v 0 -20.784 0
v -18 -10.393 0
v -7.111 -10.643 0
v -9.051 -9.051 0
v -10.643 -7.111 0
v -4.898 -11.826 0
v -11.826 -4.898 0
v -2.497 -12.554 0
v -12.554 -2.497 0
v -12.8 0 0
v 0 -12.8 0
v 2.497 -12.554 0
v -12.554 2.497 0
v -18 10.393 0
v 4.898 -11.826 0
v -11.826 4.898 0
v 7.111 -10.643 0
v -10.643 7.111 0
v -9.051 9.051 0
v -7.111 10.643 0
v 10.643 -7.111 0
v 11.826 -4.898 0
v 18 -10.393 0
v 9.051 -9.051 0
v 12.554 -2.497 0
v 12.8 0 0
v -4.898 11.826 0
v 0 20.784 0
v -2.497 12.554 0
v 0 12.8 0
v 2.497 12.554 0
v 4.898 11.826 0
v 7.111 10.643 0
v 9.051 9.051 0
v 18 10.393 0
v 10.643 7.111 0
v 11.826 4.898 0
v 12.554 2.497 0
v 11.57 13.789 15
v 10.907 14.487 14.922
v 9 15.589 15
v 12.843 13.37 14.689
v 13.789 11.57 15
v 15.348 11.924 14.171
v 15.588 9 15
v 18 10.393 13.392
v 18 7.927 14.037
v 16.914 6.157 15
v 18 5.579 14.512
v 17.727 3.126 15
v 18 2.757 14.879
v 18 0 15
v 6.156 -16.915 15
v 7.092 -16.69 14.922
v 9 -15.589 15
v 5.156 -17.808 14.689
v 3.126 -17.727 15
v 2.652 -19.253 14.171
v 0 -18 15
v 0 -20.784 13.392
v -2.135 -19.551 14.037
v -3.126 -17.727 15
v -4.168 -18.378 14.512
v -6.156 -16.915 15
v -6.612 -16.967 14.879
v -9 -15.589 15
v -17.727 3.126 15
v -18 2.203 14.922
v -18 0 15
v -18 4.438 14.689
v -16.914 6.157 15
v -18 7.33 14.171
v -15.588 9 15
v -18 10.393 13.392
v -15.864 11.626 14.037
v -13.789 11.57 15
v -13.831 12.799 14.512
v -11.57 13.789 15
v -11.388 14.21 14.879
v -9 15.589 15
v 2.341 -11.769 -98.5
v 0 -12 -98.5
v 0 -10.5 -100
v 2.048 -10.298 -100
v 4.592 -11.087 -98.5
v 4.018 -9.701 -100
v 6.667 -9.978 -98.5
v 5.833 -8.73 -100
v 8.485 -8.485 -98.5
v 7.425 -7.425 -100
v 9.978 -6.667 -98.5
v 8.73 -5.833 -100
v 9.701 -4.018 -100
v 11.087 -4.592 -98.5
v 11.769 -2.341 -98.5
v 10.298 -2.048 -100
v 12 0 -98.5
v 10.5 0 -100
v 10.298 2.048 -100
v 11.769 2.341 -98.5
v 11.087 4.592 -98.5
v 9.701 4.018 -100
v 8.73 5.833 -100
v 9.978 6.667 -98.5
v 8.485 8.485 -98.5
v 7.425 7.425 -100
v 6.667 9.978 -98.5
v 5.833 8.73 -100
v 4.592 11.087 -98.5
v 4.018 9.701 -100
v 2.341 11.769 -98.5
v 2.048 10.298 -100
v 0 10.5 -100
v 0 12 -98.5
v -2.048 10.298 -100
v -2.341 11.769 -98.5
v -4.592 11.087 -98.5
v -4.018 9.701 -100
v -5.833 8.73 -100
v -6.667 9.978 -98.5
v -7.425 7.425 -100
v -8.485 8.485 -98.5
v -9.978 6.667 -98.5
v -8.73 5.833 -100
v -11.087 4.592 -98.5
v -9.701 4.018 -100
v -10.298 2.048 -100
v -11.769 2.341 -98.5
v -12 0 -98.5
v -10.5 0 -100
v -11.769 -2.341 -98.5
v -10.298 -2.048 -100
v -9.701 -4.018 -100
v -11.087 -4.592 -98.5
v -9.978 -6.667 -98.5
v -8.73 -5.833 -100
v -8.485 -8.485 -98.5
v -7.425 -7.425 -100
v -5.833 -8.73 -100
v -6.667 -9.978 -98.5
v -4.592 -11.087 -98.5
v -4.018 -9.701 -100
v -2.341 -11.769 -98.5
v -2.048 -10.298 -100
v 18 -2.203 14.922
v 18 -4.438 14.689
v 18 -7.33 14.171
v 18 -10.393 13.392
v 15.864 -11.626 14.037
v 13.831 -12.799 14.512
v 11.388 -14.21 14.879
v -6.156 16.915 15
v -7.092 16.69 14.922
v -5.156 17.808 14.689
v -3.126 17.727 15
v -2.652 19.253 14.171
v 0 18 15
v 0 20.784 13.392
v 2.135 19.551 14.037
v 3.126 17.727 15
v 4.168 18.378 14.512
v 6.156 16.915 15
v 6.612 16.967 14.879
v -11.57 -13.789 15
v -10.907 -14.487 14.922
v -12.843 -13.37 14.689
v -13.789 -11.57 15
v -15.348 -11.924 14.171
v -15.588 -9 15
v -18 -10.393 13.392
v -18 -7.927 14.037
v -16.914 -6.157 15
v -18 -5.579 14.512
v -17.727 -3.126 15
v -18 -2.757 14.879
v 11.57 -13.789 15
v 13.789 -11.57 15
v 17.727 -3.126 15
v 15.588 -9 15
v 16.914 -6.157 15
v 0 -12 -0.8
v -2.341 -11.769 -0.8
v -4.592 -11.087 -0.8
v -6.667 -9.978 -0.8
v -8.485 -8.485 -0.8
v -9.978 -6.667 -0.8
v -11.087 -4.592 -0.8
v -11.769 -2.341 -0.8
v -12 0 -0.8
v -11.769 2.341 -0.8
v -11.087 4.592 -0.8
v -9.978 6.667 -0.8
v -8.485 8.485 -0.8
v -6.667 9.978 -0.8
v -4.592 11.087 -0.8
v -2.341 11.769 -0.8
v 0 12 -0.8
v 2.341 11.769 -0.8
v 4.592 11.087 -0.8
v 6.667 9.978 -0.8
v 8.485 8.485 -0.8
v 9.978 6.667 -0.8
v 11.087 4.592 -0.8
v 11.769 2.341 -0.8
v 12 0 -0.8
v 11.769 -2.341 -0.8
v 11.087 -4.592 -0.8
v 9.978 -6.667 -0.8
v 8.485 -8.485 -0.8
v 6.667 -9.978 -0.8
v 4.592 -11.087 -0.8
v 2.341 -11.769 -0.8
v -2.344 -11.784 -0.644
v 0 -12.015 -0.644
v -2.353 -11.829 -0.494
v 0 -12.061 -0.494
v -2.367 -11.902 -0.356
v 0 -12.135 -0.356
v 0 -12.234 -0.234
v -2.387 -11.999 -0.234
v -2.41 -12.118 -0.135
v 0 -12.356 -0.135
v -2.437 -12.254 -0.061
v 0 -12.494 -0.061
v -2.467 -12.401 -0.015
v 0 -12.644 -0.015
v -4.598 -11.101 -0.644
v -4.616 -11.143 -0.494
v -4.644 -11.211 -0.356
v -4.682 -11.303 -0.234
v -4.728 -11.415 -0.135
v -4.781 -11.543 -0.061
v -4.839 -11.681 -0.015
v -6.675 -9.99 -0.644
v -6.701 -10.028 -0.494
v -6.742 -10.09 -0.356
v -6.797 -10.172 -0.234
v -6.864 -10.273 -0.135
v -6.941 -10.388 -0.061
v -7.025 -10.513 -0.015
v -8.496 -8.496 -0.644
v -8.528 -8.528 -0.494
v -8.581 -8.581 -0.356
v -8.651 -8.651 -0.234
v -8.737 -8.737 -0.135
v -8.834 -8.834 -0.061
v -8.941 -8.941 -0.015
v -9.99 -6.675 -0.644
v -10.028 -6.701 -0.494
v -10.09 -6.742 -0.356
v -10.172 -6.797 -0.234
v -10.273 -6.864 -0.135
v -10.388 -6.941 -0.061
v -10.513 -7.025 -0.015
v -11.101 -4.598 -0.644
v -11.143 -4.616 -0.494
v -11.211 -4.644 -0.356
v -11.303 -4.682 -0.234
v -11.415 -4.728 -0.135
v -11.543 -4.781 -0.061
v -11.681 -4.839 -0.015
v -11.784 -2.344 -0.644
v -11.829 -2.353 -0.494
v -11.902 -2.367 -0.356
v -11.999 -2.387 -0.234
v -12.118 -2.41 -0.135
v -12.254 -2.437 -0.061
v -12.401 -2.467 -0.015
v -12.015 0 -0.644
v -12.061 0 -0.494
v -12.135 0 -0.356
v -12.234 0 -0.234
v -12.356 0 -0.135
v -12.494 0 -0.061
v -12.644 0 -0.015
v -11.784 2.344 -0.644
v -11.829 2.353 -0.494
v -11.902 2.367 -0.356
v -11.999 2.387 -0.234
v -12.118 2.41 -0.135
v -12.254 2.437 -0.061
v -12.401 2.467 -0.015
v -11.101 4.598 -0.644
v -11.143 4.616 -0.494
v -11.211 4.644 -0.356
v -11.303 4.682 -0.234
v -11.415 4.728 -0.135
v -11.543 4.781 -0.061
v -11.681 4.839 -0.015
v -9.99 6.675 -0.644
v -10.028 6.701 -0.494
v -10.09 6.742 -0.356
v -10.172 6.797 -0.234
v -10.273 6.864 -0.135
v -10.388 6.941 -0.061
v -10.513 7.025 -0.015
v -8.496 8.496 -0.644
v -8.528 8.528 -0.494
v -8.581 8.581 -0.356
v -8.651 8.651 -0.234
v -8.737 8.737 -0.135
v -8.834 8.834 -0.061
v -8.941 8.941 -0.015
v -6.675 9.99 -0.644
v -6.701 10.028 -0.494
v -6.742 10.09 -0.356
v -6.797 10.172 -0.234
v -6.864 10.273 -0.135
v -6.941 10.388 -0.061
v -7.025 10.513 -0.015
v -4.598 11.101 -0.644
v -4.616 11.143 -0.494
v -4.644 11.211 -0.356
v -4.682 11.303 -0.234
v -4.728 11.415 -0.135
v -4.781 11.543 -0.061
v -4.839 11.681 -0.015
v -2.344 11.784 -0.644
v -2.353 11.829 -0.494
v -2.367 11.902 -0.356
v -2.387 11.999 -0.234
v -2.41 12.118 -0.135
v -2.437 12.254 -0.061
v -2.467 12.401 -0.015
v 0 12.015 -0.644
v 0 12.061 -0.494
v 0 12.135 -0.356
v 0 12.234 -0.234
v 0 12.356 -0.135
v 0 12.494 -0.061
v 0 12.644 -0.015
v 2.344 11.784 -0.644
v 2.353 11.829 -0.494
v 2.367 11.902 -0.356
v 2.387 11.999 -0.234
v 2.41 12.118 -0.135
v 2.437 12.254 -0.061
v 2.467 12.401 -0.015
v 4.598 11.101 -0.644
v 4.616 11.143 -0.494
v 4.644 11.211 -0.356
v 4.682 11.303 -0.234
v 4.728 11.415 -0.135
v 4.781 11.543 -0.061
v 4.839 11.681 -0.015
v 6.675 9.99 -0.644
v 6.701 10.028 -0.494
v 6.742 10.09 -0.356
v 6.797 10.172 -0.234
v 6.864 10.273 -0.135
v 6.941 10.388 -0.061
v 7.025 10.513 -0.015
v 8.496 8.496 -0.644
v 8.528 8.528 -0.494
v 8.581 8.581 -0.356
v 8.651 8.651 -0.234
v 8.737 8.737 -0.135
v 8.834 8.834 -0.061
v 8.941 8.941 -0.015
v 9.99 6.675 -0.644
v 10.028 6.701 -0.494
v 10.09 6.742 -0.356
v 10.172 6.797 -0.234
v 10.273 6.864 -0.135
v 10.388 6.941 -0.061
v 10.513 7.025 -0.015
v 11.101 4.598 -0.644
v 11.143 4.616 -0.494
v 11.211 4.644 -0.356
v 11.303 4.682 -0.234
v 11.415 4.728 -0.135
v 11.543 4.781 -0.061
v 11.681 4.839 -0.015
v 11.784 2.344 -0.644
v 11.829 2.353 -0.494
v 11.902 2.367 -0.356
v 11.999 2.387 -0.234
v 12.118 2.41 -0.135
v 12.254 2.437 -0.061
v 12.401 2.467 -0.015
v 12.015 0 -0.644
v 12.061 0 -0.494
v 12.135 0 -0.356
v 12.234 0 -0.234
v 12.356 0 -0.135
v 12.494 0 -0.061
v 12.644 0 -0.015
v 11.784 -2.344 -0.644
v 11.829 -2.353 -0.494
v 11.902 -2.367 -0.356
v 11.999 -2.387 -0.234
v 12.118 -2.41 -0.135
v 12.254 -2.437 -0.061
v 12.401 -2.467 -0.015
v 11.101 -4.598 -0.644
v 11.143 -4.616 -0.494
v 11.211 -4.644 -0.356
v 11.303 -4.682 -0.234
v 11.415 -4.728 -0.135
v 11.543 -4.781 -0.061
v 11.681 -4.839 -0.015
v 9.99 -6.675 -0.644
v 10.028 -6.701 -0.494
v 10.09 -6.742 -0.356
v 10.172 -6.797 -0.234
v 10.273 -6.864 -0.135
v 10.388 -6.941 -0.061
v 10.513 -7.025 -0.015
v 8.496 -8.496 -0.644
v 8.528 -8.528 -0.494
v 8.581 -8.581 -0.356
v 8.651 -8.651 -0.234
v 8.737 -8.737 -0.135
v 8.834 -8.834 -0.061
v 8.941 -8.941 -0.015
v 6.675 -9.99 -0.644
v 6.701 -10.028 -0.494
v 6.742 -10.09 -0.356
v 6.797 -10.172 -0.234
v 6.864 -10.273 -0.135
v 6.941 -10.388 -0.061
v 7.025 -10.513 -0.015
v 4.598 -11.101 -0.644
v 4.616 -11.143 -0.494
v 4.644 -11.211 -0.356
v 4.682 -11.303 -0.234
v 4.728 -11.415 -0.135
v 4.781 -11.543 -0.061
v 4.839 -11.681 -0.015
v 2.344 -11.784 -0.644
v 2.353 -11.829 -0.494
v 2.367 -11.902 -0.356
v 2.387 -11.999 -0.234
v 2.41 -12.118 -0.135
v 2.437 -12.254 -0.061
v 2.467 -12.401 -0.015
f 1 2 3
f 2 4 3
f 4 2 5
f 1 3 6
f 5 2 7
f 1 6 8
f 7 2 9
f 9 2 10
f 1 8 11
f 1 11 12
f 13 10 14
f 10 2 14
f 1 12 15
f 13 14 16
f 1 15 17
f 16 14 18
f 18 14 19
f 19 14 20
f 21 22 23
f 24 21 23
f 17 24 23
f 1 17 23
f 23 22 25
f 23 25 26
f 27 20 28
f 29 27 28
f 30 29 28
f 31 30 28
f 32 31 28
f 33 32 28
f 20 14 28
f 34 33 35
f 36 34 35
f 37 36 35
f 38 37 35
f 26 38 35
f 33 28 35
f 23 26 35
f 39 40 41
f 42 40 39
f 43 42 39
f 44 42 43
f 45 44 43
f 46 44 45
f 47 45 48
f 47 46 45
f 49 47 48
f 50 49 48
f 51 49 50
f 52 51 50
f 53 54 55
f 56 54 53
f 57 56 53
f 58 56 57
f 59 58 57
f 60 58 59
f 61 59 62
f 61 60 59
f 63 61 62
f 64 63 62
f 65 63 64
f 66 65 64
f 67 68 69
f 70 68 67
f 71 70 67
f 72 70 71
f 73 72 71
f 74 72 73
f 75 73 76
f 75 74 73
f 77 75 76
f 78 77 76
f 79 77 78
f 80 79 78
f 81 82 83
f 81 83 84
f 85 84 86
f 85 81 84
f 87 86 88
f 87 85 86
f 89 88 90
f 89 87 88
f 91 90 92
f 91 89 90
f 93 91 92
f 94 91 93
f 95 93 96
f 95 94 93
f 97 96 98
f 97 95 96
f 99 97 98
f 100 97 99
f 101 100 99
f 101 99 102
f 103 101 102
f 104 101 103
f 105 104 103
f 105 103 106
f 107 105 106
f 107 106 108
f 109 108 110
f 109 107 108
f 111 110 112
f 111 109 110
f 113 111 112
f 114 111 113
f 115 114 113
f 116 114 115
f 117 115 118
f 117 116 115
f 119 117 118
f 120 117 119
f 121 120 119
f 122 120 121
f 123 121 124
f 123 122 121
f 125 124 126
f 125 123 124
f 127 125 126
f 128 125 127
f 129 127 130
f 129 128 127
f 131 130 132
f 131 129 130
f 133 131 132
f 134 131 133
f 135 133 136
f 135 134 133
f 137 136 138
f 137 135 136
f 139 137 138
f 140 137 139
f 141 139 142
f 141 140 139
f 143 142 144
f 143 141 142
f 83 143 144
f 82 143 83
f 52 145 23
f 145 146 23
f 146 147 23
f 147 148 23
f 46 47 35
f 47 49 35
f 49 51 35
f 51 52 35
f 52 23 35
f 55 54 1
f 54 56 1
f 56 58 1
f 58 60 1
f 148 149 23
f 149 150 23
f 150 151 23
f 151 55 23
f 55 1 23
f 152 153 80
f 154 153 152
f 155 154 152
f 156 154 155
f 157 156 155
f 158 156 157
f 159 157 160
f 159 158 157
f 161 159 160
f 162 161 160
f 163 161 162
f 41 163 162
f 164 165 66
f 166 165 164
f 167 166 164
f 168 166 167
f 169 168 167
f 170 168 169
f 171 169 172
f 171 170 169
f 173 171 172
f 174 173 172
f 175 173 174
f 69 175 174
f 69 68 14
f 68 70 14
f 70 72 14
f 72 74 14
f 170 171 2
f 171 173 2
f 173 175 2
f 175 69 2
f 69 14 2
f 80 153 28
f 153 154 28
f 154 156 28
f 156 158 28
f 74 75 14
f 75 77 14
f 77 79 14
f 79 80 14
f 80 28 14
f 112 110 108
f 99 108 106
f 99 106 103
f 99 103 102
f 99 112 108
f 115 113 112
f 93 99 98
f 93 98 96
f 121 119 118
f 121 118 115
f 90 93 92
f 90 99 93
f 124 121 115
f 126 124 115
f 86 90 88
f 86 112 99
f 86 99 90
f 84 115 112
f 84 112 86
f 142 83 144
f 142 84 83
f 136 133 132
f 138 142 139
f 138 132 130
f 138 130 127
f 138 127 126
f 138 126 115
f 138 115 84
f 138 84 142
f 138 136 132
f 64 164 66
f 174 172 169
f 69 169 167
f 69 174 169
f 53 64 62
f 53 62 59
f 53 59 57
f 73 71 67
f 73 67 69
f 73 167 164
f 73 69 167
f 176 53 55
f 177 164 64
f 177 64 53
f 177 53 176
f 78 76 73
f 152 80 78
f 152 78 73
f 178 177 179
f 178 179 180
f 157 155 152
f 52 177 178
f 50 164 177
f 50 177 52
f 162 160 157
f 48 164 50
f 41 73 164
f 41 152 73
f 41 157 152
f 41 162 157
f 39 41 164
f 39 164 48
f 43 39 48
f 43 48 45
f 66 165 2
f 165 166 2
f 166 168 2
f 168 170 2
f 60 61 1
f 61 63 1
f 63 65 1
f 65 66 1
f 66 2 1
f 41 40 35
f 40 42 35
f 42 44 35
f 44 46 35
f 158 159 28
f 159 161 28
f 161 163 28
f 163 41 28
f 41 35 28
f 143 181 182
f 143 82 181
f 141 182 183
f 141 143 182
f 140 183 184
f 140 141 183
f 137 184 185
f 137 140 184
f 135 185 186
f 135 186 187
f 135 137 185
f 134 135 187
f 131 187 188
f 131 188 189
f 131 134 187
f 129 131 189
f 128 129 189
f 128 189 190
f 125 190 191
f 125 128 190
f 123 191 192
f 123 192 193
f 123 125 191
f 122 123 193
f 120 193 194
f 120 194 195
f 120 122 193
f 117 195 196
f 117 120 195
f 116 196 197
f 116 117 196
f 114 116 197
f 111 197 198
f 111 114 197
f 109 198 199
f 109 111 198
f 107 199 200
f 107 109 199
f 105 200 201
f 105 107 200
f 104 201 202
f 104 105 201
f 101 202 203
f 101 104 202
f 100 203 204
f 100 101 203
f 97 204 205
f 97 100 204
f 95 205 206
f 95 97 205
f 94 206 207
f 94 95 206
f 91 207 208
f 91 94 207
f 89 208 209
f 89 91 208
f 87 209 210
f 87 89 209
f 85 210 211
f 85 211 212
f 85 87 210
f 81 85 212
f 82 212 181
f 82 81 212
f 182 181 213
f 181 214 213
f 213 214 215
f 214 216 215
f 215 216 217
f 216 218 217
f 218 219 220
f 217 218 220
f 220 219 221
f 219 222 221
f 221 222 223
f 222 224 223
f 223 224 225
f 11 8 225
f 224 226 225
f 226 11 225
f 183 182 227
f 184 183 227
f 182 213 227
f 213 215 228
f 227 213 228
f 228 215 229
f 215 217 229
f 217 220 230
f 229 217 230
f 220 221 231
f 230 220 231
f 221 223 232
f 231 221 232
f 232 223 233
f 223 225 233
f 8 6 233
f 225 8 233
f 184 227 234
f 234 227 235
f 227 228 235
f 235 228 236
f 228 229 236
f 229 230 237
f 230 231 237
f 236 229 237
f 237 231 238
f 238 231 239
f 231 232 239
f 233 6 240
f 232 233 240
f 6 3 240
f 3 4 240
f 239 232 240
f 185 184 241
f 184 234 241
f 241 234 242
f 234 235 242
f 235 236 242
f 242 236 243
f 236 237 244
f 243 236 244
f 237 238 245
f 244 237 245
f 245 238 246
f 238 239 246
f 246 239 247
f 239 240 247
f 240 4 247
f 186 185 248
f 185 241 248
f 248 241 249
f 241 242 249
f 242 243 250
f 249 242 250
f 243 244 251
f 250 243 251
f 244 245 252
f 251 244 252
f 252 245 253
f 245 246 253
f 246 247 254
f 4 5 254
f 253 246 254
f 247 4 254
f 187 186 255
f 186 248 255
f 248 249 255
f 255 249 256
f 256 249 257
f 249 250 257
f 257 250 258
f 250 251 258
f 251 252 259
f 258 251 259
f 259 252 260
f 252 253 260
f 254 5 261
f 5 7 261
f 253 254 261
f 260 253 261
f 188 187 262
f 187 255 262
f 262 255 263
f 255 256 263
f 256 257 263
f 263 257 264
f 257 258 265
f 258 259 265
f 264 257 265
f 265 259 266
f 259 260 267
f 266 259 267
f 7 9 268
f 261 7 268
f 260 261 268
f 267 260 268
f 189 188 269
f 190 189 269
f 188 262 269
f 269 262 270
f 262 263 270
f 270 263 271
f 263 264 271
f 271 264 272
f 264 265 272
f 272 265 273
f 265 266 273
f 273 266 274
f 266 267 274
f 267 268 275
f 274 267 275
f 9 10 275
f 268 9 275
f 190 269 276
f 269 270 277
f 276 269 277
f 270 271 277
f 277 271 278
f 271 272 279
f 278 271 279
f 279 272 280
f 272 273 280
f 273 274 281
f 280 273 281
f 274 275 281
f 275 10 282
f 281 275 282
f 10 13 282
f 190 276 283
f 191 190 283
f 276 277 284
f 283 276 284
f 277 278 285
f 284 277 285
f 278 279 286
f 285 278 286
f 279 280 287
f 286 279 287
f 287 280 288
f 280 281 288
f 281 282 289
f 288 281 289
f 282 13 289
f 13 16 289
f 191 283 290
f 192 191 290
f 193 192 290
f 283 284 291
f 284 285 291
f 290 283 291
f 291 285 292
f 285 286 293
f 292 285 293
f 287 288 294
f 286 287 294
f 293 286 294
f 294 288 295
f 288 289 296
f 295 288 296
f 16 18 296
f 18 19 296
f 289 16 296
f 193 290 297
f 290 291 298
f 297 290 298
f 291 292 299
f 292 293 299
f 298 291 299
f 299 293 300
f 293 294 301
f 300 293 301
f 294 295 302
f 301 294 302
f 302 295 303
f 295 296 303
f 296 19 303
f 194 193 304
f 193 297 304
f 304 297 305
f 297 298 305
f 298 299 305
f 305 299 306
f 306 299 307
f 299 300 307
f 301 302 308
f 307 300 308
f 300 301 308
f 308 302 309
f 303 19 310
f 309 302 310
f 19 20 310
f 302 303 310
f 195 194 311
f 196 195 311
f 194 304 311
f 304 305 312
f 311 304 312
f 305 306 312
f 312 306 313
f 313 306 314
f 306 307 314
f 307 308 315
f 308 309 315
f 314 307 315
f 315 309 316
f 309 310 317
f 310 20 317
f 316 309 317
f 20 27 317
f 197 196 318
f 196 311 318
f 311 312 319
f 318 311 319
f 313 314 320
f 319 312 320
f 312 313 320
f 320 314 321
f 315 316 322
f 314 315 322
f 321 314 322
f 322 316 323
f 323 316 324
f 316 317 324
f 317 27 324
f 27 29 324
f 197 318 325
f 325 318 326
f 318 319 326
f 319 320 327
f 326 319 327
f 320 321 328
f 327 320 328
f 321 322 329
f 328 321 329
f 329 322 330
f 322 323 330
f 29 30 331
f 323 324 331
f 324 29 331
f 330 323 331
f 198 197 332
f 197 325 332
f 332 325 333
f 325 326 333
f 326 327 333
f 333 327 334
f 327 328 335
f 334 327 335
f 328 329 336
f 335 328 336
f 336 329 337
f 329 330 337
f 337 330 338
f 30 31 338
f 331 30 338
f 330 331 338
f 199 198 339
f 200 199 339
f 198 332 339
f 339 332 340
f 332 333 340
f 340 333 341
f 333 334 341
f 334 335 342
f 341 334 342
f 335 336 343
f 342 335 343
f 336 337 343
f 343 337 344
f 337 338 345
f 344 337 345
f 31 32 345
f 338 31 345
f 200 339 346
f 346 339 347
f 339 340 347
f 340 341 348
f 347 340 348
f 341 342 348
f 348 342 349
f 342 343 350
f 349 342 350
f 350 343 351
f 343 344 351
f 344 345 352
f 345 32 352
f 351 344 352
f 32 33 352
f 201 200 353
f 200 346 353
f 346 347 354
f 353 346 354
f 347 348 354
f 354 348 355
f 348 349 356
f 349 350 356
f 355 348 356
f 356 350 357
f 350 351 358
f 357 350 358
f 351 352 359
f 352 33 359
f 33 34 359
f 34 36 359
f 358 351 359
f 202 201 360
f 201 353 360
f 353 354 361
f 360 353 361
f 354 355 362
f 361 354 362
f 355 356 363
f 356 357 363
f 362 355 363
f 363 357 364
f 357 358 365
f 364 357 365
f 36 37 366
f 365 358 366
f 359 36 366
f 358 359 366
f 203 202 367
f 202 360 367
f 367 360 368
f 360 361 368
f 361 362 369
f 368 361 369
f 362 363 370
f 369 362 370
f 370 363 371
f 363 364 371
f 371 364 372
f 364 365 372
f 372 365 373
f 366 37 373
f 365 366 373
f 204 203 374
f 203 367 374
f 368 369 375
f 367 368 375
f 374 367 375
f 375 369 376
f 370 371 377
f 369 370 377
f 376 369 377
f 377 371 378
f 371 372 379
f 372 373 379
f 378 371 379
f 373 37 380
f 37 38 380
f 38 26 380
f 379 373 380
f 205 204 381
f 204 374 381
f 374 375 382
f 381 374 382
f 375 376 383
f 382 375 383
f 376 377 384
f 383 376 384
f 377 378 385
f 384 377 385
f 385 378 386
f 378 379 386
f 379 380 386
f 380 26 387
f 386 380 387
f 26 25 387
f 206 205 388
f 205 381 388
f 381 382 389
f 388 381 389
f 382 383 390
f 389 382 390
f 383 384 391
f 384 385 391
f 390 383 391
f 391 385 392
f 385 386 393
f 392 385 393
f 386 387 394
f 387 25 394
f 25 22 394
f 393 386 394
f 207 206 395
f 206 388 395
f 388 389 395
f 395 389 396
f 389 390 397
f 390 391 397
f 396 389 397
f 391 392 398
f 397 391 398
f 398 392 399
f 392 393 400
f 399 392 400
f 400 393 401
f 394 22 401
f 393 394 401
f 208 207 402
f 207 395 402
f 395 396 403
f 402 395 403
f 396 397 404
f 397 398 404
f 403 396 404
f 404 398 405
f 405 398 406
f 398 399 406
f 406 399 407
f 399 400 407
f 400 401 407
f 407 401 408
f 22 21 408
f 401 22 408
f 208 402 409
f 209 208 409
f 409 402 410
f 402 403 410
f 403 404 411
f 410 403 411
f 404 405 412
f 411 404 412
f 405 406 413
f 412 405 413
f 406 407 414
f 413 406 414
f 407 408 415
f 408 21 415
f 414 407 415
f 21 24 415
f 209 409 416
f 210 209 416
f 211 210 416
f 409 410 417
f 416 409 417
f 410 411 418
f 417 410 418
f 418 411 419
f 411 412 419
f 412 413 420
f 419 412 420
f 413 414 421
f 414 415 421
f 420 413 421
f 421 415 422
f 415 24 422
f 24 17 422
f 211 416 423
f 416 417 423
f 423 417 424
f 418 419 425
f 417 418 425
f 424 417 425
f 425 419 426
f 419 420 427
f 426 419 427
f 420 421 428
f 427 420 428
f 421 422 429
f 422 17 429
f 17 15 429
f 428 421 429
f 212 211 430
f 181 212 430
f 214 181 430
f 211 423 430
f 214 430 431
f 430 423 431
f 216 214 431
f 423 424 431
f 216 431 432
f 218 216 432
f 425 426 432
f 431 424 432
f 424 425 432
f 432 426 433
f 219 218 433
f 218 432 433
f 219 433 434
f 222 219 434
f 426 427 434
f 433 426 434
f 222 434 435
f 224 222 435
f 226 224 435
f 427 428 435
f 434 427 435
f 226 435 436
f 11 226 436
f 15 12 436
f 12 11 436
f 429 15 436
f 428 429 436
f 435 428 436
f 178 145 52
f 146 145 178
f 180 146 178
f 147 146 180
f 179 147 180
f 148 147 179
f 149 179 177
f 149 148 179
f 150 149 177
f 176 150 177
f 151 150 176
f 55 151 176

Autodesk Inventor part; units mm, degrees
ref_plane "WorkPlane1" through (0, 0, 0) normal (0, 0, 1) x (1, 0, 0)
sketch "Sketch1" plane through (0, 0, 0) normal (0, 0, 1) x (1, 0, 0)
  point P0 (0, 0)
sketch "Sketch2" plane through (0, 0, 0) normal (0, 0, 1) x (1, 0, 0)
  line L0 (-18, 10.3926) -> (-18, -10.3926)
  line L1 (0, 20.7843) -> (-18, 10.3926)
  line L2 (18, 10.3926) -> (0, 20.7843)
  line L3 (18, -10.3926) -> (18, 10.3926)
  line L4 (0, -20.7843) -> (18, -10.3926)
  line L5 (-18, -10.3926) -> (0, -20.7843)
  circle A0 centre (0, 0) radius 18 construction
  dimension "d1" = 36
  dimension "d29" = 0
  dimension "d30" = 0
extrude "Extrusion1" add sketch "Sketch2" along normal blind 15
sketch "Sketch3" plane through (0, 0, 0) normal (1, 0, 0) x (0, 1, 0)
  line L0 (18, 15) -> (20.8843, 15)
  line L1 (20.8843, 13.3347) -> (18, 15)
  line L2 (20.8843, 15) -> (20.8843, 13.3347)
  line L3 (0, -3) -> (0, 18) projected
  line L4 (20.7843, 0) -> (20.7843, 15) projected
  dimension "d25" = 0.1
  dimension "d26" = 0
  dimension "d27" = 60
  dimension "d28" = 18
revolve "Revolution1" cut sketch "Sketch3" angle 360 about axis through (0, 0, -10) along (0, 0, 1)
sketch "Sketch4" plane through (0, 0, 0) normal (1, 0, 0) x (0, 1, 0)
  line L0 (0, -100) -> (0, 0)
  line L1 (-12, -100) -> (0, -100)
  line L2 (-12, 0) -> (-12, -100)
  line L3 (0, 0) -> (-12, 0)
  line L4 (0, -100) -> (0, 0)
  line L5 (-14.4, 0) -> (2.4, 0) projected
  line L6 (0, -120) -> (0, 20) projected
  dimension "d18" = 12
  dimension "d20" = 100
  dimension "d33" = 0
  dimension "d34" = 0
revolve "Revolution2" add sketch "Sketch4" angle 360 about axis through (0, 0, -100) along (0, 0, -1)
chamfer "Chamfer1" distance 1.5 angle 45 1 edges at (0, 12, -100)
fillet "Fillet1" radius 0.8 1 edges at (0, 12, 0)
thread "Thread1" size "M24x3" class "6g" standard "ISO Metric profile" length 54
ref_plane "MSC_PF1" through (0, 0, 0) normal (1, 0, 0) x (0, 1, 0)
ref_plane "MSC_PT1" through (0, 0, 0) normal (0, 0, -1) x (-1, 0, 0)
equation "\"d22\" = 0.5 * PTC"
equation "\"d23\" = 0.5 * PTC"
equation "\"d24\" = r"
equation "\"d1\" = ParS"
equation "\"d6\" = ParK"
equation "\"d28\" = 0.5 * ParS"
equation "\"d18\" = 0.5 * NND"
equation "\"d20\" = NLG"
equation "\"NND\" = 24"
equation "\"NLG\" = 100"
equation "\"PTC\" = 3"
equation "\"ParK\" = 15"
equation "\"ParS\" = 36"
equation "\"msp_es\" = 0.577367 * ParS"
equation "\"r\" = 0.8"
equation "\"THREADDIA\" = NND"
properties part number "ISO 4016 - M24 x 100" material "Steel"
